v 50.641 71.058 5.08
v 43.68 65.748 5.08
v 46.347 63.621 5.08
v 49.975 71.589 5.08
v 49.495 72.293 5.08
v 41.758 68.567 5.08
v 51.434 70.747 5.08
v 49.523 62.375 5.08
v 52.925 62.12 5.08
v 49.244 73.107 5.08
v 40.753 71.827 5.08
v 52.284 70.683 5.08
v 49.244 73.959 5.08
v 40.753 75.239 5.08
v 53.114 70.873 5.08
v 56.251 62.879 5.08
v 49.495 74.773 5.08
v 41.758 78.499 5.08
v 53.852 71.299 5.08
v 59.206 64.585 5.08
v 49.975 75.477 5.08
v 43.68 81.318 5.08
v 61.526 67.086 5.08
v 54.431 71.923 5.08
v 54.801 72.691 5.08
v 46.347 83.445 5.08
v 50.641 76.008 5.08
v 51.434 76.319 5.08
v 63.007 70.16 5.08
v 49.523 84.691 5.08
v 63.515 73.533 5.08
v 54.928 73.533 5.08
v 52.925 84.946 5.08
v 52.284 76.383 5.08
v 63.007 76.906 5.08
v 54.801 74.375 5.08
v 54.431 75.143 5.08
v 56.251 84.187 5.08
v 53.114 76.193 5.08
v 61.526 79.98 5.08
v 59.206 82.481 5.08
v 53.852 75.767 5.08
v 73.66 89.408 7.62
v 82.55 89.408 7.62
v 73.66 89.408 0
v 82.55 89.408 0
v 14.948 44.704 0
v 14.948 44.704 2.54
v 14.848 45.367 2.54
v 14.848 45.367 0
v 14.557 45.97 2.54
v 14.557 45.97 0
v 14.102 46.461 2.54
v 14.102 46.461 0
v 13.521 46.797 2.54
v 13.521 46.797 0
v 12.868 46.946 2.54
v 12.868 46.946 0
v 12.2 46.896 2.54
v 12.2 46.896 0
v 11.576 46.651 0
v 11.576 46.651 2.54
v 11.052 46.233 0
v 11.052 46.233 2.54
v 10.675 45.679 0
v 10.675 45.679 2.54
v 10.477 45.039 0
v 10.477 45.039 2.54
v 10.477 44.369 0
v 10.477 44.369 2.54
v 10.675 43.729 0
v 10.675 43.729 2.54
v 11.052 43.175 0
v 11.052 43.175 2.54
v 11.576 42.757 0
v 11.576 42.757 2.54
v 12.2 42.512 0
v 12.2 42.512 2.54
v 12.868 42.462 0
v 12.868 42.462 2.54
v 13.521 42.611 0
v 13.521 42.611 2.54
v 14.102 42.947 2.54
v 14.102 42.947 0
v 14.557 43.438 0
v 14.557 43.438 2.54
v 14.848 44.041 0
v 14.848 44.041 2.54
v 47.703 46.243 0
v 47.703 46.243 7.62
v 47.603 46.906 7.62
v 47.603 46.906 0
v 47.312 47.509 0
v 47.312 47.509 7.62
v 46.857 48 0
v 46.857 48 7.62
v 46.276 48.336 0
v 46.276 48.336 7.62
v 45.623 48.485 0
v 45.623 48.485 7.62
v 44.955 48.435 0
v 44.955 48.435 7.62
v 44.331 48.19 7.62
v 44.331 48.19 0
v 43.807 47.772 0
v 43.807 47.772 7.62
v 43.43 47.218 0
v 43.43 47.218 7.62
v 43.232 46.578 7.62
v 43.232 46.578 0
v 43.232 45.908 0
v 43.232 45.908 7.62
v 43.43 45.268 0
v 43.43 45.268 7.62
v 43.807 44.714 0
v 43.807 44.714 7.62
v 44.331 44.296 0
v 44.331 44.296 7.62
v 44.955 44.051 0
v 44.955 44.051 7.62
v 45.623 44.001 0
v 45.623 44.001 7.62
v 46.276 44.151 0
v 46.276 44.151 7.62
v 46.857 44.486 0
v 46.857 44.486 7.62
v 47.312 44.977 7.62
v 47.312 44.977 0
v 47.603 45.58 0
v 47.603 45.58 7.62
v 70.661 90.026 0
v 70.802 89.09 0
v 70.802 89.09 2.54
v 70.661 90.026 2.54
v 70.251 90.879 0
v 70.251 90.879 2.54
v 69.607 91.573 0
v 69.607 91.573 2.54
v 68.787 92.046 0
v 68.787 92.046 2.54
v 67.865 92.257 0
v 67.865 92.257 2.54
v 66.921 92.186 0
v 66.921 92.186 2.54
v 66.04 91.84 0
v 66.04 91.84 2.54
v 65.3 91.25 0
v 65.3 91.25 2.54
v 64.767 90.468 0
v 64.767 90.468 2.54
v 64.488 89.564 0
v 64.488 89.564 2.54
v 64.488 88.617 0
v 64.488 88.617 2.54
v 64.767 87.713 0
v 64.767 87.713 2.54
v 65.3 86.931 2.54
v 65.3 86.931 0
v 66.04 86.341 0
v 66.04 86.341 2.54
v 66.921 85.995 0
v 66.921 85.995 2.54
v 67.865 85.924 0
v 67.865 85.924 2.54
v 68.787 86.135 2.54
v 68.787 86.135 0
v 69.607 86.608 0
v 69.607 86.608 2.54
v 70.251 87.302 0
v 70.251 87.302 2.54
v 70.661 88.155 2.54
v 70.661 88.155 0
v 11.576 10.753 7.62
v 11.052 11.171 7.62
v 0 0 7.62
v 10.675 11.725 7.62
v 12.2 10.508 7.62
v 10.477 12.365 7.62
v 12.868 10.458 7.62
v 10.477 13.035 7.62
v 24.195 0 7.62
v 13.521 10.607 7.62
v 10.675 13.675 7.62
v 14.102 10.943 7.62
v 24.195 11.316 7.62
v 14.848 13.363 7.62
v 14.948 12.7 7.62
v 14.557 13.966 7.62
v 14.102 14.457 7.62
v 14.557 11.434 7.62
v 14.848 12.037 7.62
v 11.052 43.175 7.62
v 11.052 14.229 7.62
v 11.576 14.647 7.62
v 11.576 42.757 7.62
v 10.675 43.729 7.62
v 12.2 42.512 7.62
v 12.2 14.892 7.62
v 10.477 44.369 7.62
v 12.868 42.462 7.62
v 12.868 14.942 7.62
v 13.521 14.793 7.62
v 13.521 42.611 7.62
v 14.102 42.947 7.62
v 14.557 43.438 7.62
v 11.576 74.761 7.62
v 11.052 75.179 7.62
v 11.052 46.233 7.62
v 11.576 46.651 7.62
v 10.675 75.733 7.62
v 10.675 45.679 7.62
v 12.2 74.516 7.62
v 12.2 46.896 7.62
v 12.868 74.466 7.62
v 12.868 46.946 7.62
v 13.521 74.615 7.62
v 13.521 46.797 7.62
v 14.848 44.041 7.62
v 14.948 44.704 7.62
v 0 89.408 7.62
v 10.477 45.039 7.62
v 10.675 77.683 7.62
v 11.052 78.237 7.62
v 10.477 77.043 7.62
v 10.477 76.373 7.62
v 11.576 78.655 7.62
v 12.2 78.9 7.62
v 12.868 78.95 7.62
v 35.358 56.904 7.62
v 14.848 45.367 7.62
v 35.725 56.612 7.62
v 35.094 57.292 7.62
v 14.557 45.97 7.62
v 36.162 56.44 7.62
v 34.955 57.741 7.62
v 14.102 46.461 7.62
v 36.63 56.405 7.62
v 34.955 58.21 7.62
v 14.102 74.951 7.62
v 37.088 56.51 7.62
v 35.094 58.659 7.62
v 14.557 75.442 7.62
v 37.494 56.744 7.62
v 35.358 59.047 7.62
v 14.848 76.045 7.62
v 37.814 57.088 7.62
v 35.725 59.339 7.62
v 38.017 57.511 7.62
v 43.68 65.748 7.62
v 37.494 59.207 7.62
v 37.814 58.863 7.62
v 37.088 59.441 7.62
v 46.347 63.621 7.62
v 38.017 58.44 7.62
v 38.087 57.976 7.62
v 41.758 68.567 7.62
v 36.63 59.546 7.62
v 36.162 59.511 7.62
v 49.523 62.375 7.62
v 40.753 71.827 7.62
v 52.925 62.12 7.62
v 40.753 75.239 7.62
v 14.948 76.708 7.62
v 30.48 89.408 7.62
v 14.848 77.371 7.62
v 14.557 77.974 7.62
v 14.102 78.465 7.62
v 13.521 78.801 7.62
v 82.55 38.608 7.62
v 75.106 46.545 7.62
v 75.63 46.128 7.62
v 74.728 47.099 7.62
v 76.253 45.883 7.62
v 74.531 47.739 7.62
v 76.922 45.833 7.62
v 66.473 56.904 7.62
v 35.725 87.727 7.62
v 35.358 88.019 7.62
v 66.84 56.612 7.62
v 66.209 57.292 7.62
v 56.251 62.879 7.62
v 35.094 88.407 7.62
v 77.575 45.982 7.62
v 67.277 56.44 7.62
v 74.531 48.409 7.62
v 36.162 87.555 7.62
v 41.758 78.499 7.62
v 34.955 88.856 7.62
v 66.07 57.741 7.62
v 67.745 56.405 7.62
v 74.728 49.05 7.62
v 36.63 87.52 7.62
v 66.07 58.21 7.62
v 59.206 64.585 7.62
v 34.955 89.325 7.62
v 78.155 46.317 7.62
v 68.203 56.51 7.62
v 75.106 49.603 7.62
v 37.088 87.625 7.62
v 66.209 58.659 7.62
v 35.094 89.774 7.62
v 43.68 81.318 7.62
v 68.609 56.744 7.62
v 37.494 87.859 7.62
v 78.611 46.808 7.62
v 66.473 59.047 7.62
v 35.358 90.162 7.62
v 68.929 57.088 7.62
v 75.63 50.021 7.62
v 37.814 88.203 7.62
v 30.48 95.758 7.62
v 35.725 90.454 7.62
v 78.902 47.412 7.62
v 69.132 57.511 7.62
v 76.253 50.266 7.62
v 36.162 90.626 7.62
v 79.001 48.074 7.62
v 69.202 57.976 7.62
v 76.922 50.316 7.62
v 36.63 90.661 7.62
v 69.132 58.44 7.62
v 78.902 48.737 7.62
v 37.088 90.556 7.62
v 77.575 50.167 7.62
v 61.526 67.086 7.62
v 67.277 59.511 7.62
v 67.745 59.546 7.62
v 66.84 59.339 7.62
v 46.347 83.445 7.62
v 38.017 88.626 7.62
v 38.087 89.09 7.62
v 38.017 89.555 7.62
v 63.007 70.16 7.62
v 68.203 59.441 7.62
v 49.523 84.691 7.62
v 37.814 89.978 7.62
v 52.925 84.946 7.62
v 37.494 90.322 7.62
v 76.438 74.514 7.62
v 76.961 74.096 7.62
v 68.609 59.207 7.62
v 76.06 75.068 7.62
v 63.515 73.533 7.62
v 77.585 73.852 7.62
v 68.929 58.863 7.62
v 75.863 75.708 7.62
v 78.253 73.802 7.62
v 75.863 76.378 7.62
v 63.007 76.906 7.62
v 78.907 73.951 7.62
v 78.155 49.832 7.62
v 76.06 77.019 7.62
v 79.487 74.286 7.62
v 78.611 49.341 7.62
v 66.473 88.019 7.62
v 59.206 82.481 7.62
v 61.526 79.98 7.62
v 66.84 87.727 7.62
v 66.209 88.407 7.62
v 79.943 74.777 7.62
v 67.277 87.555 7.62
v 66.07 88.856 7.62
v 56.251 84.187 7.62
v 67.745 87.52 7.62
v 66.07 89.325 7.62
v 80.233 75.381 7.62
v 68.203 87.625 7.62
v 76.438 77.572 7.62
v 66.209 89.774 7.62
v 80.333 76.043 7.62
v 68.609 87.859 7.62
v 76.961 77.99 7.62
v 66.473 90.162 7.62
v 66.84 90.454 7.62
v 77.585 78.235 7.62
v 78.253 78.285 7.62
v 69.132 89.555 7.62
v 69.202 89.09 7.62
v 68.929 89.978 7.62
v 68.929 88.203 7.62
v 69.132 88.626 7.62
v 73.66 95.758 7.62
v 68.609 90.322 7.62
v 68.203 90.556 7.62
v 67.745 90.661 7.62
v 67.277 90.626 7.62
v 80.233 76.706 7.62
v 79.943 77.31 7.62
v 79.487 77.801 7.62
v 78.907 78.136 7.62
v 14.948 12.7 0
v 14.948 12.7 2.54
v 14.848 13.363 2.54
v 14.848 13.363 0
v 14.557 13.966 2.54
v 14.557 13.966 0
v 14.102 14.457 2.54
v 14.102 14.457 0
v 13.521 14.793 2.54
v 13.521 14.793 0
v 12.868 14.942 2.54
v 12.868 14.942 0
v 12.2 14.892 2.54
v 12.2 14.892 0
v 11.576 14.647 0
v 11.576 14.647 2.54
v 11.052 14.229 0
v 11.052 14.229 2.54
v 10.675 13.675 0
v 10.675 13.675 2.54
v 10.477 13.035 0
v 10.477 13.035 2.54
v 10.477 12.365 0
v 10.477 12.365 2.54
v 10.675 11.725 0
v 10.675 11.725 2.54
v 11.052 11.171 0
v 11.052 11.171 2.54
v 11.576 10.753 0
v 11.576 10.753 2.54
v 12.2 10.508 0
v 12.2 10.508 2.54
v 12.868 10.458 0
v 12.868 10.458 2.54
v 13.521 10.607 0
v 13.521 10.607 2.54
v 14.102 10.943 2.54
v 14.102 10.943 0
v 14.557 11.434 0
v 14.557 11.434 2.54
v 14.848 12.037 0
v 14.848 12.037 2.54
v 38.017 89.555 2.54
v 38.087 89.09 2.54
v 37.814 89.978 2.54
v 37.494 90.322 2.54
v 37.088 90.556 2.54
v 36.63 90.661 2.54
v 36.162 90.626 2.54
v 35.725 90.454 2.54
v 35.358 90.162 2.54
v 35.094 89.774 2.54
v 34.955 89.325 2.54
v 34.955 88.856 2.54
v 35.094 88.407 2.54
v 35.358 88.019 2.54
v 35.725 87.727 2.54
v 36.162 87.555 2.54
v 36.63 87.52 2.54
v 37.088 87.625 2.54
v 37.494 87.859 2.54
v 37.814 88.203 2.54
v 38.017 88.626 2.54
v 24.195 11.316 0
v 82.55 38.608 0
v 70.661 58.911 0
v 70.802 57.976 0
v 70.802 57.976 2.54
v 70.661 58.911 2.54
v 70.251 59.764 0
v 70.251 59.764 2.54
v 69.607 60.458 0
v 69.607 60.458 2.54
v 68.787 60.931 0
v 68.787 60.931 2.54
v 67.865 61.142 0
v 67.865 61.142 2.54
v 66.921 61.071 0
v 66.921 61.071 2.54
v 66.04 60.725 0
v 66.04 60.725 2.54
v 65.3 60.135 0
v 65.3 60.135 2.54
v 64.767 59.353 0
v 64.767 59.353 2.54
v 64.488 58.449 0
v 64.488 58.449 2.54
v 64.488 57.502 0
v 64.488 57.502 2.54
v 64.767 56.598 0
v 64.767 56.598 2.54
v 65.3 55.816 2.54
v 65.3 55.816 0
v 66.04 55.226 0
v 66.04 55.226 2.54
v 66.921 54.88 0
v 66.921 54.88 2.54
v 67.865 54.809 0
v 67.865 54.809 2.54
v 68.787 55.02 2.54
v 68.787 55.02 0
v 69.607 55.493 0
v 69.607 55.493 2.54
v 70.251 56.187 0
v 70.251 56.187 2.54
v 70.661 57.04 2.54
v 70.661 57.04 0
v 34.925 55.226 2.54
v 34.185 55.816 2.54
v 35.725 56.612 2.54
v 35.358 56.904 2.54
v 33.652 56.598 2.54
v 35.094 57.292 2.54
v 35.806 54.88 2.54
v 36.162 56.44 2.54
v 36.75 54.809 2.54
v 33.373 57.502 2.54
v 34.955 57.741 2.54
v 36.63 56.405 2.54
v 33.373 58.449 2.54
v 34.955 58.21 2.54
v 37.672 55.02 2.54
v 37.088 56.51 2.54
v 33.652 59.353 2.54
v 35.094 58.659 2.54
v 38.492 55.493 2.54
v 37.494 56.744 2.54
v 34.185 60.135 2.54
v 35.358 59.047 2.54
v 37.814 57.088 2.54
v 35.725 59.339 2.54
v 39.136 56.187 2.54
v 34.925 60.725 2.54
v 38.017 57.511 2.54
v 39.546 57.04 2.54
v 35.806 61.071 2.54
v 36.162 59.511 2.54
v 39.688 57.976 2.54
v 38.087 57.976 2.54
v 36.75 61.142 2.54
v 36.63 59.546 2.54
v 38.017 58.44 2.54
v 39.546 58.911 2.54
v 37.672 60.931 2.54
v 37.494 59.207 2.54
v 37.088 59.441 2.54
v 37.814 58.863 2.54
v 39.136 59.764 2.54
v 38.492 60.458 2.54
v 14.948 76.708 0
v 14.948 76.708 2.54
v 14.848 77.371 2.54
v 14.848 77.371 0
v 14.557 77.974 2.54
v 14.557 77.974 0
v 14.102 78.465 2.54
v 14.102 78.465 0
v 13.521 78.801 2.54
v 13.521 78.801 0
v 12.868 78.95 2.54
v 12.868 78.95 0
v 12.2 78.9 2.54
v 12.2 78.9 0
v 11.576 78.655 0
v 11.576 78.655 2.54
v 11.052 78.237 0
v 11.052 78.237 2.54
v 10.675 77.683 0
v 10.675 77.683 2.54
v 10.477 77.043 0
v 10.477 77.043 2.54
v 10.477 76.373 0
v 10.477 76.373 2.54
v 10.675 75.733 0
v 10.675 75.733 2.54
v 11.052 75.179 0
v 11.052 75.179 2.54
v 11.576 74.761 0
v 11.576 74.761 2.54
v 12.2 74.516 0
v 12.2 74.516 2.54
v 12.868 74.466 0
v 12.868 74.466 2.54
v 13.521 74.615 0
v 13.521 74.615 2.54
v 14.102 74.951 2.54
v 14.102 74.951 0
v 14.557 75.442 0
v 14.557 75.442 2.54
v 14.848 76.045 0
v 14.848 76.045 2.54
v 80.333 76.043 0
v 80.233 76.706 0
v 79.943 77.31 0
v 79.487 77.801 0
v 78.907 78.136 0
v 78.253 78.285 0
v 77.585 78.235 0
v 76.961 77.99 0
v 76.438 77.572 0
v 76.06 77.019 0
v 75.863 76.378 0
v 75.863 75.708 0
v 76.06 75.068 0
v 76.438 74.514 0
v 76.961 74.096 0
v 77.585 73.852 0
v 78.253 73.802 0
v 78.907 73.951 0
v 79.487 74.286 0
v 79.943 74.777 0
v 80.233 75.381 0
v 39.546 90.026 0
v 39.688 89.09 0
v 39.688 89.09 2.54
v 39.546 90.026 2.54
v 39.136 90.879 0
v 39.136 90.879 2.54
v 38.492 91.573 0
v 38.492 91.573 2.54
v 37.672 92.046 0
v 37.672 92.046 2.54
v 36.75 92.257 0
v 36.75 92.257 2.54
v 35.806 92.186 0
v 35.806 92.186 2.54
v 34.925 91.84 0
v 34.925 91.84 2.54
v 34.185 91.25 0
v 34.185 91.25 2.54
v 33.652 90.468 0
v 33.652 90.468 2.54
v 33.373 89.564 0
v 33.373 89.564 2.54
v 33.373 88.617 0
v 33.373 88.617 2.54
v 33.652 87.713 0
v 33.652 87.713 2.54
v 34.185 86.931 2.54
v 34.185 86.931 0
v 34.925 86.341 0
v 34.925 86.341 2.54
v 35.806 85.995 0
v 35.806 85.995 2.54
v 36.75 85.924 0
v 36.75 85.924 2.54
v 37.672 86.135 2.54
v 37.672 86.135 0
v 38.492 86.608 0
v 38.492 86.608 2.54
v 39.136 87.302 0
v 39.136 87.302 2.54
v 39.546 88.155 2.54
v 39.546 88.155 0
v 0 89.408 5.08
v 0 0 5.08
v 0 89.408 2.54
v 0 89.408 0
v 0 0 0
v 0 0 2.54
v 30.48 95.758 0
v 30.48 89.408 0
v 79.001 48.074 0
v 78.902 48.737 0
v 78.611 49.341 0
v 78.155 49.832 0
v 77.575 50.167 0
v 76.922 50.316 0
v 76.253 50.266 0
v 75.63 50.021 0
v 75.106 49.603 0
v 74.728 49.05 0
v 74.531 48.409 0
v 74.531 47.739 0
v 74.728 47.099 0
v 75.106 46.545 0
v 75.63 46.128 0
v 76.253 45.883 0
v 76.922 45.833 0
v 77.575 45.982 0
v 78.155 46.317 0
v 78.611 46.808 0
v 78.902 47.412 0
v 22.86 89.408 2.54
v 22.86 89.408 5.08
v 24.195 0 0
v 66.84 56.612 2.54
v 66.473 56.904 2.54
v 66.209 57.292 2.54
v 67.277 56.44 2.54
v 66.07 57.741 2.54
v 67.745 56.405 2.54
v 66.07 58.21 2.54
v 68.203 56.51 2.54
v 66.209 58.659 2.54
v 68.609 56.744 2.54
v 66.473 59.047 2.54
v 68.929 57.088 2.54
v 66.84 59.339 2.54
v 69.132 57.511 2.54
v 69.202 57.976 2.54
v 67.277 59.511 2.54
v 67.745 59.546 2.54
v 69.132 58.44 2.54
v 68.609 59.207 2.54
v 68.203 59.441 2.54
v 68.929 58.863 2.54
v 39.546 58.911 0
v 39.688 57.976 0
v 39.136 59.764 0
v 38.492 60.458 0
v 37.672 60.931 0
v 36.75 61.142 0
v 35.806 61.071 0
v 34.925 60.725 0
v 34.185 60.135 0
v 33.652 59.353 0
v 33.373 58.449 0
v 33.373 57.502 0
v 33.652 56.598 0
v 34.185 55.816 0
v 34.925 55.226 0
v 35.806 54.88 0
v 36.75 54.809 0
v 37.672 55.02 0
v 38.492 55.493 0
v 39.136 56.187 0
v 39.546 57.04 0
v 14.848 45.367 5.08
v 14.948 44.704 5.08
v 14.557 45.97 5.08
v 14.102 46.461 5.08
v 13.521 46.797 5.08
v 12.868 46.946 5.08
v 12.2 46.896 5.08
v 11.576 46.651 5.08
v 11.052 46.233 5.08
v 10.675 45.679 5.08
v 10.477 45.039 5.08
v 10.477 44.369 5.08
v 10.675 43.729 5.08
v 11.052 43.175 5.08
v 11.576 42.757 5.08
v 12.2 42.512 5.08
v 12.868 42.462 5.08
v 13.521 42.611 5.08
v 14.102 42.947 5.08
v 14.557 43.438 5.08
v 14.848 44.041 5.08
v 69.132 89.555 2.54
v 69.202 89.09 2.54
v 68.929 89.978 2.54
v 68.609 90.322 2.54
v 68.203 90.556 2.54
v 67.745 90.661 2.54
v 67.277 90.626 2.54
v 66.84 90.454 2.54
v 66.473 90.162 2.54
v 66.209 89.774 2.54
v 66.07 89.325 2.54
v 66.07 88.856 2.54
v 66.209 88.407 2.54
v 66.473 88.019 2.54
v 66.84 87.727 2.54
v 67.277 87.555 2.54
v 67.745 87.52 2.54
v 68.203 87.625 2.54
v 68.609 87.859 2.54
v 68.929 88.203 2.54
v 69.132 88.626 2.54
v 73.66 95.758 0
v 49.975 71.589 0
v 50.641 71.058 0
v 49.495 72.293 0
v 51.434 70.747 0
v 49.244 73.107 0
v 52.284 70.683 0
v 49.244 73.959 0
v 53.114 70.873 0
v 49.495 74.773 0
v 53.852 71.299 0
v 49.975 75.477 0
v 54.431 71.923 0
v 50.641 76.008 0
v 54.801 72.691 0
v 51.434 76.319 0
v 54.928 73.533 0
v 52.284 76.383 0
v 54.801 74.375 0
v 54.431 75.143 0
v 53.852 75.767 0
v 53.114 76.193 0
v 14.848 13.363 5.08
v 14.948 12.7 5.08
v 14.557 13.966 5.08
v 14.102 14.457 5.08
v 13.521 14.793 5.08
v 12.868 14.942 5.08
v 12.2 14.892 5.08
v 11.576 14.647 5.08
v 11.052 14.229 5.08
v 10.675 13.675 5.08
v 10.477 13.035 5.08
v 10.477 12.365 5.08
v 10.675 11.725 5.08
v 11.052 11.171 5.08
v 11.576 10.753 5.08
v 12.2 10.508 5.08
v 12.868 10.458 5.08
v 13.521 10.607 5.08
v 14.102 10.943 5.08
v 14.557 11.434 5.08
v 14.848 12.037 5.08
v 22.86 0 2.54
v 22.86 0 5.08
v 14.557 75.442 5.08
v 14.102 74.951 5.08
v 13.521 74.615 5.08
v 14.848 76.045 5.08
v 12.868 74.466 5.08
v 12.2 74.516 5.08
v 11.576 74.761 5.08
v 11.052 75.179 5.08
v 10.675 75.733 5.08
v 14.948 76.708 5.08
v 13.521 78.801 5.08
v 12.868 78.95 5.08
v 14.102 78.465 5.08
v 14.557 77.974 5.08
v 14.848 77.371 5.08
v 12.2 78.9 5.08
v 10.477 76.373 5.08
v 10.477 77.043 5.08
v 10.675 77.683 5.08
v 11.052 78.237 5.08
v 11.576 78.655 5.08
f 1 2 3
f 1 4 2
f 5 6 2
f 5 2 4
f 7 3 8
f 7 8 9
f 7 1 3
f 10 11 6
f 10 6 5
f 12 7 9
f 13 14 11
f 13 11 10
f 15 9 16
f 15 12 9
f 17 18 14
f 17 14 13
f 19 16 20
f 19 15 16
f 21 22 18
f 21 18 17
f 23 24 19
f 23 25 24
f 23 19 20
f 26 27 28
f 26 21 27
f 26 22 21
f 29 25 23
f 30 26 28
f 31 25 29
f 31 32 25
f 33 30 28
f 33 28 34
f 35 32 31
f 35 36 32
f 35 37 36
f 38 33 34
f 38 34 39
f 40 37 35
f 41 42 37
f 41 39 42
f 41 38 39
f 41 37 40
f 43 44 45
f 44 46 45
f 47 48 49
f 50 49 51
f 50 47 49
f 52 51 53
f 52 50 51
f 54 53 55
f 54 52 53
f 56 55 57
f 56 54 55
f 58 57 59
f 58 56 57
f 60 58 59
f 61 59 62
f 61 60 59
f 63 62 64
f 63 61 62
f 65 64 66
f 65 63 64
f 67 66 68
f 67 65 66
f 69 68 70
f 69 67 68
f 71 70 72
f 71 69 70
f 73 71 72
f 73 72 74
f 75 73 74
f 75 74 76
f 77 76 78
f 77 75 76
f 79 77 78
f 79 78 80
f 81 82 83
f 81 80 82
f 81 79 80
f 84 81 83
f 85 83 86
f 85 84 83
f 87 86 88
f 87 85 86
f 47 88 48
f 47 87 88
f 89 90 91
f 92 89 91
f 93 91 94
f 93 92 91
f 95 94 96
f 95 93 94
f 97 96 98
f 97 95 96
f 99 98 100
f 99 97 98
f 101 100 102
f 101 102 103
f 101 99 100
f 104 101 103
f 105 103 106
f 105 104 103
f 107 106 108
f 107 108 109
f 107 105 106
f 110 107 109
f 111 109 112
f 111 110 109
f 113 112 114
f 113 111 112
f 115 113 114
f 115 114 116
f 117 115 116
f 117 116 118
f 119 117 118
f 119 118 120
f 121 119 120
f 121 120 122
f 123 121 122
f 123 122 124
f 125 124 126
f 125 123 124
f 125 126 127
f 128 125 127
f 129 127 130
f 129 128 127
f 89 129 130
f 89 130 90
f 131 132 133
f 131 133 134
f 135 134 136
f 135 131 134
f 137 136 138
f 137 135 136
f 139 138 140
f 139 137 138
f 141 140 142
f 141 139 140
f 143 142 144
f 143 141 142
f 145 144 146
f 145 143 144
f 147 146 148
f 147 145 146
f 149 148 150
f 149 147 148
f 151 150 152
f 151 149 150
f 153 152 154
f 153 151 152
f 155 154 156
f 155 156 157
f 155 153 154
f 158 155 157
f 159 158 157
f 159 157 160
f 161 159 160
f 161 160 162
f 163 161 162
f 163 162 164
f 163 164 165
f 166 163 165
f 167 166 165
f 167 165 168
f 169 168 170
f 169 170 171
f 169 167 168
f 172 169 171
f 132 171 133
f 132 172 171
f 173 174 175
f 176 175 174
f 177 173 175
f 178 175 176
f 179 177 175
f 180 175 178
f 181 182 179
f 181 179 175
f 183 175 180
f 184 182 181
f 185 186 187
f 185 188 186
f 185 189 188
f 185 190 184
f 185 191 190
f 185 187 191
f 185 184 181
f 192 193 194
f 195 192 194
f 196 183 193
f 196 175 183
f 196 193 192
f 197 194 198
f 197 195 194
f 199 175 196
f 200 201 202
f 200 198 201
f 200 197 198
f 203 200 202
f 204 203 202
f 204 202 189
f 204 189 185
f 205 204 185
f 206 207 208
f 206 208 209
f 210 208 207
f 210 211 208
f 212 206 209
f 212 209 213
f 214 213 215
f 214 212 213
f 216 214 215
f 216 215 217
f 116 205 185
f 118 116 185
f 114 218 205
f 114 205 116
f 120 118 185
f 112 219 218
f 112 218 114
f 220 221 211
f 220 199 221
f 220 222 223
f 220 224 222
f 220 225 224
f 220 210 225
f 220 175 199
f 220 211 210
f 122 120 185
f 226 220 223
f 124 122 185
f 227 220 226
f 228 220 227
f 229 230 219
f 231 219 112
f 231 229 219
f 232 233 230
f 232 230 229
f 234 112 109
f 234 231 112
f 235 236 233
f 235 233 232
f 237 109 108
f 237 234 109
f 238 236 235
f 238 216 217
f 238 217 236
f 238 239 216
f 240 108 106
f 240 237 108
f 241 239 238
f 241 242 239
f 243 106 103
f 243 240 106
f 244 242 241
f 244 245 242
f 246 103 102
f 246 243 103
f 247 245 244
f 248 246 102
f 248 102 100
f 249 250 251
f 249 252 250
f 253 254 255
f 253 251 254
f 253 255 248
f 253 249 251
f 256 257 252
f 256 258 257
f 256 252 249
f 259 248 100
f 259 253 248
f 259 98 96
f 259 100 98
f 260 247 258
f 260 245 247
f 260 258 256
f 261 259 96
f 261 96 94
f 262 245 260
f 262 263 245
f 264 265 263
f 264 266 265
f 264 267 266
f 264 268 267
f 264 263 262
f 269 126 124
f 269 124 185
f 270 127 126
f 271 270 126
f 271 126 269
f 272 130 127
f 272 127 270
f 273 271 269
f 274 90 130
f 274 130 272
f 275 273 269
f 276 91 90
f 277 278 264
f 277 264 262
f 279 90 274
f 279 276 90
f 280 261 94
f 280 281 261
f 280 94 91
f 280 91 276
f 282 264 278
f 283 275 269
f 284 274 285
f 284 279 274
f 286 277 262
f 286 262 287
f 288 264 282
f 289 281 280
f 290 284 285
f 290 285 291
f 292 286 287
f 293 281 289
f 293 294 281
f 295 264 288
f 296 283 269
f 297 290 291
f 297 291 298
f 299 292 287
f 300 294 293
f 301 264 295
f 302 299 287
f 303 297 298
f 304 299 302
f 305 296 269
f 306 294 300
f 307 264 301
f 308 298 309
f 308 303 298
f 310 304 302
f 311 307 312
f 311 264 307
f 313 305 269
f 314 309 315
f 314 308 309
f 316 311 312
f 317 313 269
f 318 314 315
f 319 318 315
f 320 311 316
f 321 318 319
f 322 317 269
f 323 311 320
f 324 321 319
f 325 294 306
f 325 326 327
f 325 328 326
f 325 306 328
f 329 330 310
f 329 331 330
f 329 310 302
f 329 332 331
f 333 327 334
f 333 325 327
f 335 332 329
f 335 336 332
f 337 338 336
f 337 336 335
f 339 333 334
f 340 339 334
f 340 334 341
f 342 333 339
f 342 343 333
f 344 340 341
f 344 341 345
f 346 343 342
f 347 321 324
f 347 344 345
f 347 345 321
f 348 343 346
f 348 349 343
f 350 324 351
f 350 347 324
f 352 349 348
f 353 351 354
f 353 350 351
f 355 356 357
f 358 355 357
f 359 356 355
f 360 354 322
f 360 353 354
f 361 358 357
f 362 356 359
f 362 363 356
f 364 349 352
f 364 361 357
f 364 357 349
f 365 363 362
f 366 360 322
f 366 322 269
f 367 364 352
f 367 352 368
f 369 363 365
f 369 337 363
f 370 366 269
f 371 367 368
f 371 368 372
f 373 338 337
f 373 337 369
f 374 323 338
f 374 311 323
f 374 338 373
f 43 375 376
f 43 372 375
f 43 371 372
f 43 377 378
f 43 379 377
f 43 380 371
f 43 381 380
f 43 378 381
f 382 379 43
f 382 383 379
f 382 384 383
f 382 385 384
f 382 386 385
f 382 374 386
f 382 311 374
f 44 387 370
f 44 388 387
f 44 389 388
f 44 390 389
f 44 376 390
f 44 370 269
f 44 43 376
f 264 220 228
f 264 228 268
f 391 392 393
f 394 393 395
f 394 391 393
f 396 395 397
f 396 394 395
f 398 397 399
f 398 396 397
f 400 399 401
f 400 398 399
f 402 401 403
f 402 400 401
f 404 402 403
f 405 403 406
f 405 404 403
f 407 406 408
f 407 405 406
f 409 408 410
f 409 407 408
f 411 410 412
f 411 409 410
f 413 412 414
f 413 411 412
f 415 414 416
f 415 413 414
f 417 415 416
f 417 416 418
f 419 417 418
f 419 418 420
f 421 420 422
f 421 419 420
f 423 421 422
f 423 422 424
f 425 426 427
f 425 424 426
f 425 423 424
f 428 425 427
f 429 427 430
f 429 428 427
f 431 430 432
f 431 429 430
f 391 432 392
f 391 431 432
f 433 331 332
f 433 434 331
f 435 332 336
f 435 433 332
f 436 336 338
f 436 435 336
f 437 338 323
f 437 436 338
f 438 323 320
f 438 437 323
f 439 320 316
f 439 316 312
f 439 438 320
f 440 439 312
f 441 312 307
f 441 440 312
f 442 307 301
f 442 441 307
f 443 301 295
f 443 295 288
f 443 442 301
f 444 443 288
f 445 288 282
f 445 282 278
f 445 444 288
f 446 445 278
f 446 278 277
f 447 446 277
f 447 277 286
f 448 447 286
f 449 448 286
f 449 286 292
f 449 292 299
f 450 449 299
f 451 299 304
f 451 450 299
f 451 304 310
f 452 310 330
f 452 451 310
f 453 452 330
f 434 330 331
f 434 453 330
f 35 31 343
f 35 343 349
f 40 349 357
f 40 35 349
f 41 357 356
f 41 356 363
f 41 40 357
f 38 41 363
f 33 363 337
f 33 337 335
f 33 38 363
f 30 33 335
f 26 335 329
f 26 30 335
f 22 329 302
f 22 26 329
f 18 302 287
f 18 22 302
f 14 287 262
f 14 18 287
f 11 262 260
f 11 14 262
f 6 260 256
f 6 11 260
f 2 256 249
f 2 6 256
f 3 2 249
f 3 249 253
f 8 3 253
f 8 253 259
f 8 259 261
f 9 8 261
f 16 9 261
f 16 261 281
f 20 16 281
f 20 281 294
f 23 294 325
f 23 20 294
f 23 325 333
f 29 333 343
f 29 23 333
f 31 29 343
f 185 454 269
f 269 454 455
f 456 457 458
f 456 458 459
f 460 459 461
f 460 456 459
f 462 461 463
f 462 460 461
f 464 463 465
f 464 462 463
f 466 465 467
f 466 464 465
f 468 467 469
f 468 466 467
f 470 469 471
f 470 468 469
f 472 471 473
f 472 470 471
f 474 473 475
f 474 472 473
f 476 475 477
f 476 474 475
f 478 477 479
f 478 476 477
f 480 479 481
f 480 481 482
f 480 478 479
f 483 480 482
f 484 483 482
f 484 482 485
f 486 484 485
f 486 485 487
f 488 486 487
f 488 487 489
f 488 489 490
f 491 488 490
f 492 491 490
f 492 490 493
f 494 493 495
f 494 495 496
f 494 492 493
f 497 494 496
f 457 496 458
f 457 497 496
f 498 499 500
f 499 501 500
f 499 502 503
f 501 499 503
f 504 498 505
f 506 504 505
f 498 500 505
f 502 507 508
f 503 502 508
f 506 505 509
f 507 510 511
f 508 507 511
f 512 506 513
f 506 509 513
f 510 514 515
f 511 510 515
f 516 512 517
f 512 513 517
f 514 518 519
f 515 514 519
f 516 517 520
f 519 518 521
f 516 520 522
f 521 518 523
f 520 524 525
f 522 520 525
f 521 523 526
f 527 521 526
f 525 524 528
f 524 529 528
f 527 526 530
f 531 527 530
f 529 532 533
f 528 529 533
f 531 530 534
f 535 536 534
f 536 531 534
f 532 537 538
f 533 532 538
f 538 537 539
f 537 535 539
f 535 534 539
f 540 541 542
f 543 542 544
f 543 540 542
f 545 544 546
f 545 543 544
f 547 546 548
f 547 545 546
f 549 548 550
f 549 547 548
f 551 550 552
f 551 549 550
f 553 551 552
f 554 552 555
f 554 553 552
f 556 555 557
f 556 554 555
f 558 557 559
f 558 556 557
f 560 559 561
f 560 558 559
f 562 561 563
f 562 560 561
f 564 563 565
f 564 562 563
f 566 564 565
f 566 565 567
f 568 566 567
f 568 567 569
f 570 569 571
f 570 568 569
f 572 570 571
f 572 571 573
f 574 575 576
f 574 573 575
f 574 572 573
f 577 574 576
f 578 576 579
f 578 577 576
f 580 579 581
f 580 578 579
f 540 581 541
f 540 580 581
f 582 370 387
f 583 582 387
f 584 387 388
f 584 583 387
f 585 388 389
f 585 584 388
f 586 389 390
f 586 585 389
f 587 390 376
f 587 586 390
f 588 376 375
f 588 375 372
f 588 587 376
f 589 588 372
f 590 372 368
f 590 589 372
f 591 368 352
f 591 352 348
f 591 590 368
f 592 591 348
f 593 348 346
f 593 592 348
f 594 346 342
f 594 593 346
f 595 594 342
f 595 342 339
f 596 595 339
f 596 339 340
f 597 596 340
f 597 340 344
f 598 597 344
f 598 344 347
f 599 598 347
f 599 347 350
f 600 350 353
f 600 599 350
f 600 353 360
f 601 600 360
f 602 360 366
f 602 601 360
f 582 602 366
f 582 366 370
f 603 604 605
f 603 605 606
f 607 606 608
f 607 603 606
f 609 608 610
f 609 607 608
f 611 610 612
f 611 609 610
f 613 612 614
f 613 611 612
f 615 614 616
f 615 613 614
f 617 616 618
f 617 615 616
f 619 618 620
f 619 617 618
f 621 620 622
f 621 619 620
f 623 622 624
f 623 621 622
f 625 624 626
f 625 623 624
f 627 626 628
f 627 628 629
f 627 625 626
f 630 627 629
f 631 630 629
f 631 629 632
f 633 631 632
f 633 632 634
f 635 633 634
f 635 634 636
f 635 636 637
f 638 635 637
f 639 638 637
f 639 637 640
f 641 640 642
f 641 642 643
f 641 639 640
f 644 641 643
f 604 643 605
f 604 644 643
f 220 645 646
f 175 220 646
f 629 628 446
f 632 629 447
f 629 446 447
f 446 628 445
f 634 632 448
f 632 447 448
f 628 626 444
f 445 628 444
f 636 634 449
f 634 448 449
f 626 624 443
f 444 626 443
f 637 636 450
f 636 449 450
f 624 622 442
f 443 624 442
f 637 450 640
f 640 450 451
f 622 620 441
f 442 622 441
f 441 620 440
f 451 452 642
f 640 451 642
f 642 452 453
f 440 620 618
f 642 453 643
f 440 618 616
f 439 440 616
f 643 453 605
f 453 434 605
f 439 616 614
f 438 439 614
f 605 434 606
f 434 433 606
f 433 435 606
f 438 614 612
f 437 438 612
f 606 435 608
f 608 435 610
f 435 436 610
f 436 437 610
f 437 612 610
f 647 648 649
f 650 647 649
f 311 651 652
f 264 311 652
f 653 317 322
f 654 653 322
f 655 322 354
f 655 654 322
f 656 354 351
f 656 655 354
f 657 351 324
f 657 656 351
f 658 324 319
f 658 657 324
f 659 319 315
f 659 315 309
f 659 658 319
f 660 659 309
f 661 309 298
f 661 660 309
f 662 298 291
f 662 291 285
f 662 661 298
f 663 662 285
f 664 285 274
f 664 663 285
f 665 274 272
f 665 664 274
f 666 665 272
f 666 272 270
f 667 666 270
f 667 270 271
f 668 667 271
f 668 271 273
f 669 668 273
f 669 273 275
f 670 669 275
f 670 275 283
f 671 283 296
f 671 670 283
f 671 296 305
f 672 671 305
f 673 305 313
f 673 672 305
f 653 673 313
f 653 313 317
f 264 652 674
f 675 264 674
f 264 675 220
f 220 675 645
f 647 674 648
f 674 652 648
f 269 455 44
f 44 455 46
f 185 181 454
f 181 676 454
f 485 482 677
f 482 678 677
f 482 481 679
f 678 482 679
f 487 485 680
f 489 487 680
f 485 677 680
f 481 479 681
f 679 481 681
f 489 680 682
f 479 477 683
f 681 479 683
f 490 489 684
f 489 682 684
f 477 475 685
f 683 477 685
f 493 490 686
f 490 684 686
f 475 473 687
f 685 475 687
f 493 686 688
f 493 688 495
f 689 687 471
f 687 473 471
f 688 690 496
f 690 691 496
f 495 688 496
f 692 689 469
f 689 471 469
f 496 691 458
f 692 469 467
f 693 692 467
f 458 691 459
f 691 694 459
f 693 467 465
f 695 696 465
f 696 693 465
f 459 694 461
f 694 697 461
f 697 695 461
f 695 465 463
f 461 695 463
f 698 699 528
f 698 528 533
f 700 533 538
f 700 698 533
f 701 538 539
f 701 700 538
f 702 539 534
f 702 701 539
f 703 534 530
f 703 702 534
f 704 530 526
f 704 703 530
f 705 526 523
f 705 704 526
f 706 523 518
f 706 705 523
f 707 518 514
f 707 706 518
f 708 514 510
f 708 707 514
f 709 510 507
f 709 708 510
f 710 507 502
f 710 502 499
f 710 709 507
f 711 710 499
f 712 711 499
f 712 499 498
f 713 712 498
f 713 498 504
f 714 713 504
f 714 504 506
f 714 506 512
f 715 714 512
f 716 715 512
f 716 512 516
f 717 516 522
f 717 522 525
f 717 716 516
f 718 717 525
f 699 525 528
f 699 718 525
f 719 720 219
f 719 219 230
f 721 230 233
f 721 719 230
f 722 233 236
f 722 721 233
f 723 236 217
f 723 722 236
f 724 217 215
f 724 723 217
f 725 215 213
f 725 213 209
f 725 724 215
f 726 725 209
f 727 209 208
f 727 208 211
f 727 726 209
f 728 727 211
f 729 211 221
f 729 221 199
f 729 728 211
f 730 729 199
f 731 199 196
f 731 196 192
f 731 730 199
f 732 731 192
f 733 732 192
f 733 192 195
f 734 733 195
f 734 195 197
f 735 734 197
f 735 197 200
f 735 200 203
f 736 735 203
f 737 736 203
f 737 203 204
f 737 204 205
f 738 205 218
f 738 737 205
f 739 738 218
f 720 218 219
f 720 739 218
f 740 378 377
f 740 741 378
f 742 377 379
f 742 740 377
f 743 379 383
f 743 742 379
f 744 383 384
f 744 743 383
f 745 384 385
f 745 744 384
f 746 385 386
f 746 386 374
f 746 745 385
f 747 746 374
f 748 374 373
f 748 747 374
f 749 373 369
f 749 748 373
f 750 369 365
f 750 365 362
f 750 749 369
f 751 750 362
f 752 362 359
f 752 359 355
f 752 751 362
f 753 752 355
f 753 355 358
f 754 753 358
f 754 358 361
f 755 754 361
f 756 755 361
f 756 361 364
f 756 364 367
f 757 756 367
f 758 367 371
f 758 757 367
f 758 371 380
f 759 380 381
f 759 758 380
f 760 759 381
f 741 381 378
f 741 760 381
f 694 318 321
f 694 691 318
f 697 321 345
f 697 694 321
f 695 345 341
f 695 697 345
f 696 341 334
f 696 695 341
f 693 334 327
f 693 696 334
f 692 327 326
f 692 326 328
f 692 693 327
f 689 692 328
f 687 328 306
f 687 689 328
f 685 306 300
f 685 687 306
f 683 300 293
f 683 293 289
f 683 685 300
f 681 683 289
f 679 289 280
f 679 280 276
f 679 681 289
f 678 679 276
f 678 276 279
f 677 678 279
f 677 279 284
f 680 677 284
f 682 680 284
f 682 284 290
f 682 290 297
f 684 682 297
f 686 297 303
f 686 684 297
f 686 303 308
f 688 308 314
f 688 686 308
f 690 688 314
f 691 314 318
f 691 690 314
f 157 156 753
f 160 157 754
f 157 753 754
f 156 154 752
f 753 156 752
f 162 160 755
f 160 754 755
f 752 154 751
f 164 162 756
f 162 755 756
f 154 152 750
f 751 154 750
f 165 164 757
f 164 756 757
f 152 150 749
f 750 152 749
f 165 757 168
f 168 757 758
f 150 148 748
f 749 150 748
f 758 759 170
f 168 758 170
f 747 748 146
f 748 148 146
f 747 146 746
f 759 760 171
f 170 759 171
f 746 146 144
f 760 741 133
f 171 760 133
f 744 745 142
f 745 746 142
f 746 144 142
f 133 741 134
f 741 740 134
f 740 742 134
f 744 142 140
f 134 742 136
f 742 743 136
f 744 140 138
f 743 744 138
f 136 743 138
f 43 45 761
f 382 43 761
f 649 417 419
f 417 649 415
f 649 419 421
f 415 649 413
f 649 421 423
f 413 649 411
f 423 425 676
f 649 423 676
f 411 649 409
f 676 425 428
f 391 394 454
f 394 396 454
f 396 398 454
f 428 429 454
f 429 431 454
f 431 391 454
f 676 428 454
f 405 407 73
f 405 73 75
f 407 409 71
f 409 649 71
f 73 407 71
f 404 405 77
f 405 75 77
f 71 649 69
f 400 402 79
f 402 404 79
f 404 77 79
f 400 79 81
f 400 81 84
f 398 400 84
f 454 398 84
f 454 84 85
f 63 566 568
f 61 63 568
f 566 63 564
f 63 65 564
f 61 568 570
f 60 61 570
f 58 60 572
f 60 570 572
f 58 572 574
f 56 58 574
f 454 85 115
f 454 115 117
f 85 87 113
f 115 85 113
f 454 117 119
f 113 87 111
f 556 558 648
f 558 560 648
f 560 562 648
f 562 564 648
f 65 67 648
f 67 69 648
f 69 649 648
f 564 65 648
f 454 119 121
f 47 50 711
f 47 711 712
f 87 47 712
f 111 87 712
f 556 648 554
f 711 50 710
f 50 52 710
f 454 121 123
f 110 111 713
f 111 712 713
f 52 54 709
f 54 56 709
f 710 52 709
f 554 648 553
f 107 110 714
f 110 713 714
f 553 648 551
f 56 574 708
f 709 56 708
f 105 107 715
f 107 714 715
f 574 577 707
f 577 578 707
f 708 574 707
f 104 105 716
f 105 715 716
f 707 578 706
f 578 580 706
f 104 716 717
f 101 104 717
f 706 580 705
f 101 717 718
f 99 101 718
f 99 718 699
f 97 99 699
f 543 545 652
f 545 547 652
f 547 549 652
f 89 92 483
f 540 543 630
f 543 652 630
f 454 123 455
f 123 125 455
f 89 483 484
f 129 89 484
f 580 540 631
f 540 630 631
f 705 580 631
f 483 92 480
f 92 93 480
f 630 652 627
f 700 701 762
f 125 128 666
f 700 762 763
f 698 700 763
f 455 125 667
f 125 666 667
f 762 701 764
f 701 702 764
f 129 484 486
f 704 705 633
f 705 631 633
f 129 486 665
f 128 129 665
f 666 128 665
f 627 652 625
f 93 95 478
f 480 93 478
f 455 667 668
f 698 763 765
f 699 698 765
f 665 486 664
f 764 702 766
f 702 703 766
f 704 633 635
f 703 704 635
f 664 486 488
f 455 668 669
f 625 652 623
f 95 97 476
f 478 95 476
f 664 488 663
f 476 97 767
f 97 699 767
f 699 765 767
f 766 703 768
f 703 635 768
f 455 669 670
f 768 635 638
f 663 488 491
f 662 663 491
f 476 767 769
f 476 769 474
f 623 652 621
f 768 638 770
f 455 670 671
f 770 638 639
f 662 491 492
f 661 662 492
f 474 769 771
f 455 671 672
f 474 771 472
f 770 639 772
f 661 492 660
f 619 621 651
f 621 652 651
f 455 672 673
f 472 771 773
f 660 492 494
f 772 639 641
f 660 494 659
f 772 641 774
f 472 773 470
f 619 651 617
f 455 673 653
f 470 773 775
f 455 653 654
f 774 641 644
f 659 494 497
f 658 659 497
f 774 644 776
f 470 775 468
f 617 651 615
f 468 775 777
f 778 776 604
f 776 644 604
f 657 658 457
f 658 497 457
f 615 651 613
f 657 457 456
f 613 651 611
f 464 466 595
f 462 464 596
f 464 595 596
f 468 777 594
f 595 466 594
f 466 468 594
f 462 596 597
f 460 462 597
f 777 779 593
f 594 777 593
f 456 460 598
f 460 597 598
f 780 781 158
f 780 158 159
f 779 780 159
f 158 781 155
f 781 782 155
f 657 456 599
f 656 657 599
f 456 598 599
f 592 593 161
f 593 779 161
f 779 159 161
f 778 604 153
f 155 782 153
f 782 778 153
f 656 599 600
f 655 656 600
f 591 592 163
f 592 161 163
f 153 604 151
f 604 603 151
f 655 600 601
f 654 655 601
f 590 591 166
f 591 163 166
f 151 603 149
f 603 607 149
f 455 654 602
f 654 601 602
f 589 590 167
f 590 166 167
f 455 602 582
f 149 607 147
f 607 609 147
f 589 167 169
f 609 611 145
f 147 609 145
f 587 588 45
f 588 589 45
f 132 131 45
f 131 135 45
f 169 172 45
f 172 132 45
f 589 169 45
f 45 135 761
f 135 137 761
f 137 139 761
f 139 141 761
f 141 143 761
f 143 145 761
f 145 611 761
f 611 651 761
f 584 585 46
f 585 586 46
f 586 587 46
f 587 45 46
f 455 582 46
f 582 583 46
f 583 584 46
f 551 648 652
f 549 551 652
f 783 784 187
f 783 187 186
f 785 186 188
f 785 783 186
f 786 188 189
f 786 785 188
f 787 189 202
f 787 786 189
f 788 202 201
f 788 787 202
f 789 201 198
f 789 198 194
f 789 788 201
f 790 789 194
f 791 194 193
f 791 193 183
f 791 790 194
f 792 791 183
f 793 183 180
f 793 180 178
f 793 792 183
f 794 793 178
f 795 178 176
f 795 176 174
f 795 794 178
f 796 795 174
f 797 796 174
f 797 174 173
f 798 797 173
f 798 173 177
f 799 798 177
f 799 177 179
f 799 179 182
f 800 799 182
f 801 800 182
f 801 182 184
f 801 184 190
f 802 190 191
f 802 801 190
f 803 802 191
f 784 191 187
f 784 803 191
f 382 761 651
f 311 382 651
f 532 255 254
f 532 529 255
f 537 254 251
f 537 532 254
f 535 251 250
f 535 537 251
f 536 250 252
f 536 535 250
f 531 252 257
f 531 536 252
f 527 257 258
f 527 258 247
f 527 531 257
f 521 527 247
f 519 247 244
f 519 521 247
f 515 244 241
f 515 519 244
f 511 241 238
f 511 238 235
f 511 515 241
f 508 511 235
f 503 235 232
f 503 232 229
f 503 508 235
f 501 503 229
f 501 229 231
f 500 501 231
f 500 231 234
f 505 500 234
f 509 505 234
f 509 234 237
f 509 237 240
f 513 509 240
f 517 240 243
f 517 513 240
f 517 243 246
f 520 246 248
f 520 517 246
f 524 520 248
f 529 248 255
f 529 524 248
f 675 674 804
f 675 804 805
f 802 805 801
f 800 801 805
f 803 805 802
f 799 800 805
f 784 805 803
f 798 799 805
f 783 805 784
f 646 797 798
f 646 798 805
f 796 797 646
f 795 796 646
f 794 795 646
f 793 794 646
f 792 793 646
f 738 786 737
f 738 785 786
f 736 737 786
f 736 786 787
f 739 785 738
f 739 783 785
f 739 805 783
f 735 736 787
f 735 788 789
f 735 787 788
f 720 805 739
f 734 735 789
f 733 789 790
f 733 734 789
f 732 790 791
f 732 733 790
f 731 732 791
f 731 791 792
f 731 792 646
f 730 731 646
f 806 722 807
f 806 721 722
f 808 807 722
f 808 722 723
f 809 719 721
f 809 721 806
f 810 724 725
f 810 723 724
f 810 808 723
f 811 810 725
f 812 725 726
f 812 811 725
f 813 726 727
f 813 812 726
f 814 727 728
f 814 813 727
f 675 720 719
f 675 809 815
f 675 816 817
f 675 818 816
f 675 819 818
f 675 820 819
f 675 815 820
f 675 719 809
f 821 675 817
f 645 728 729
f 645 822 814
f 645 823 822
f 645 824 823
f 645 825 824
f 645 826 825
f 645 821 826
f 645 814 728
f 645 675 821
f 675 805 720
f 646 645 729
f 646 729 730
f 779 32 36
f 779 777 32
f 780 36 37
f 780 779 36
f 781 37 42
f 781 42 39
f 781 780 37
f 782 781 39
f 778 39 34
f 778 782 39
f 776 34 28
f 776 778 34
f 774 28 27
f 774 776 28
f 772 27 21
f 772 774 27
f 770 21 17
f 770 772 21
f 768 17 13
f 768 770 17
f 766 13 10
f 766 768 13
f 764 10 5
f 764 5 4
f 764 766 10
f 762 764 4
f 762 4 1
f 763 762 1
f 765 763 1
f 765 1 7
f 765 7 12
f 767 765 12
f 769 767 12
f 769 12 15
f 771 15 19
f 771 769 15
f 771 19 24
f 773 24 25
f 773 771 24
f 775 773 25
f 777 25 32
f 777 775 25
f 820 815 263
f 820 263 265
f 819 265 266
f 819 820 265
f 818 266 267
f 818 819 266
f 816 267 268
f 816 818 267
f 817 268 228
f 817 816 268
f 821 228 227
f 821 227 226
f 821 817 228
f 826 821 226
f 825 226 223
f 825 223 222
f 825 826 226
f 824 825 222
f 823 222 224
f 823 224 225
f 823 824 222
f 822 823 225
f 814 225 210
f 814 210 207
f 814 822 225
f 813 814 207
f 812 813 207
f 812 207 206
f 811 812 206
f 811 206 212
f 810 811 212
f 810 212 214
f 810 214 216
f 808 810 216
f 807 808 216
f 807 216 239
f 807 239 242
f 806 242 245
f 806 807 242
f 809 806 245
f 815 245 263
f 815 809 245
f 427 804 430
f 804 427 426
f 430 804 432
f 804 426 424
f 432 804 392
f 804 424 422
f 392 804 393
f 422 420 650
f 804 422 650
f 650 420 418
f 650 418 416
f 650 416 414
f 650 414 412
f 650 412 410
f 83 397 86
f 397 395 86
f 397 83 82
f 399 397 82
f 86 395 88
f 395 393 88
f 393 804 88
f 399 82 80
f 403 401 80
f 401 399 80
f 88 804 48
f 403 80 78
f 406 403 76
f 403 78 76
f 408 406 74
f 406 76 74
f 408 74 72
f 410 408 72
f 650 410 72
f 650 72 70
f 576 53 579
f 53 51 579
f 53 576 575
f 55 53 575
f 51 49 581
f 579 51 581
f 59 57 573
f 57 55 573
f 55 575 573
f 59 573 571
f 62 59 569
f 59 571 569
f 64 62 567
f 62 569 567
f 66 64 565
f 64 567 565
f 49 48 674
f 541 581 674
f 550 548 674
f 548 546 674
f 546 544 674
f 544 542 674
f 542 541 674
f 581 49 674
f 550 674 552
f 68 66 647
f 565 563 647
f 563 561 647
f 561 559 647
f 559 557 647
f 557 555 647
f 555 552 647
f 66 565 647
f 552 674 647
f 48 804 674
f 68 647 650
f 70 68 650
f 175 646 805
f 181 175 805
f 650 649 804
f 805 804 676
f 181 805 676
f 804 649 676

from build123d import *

# Parameters (mm, degrees)
F0_R     = 2.2479
F0_R_2   = 3.175
F0_R_3   = 11.43
F0_R_4   = 2.8575
F1_DEPTH = 2.54
F2_R     = 2.2479
F2_R_2   = 3.175
F2_R_3   = 2.8575
F2_R_4   = 1.574685516
F3_DEPTH = 2.54
F4_R     = 2.2479
F4_R_2   = 1.574685516
F4_R_3   = 11.4450762602
F5_DEPTH = 2.54
F6_DEPTH = 5.08
F7_W     = 22.86
F7_H     = 2.54
F8_DEPTH = 89.409


with BuildPart() as f1:
    # F0 (on Top) → F1 (new body)
    with BuildSketch(Plane.XY):
        Polygon((0, 89.408), (0, 0), (24.1954457015, 0), (24.1954457015, 11.3160238358), (82.55, 38.608), (82.55, 89.408), (73.66, 89.408), (73.66, 95.758), (30.48, 95.758), (30.48, 89.408), align=None)
        with Locations((12.7, 12.7)):
            Circle(F0_R, mode=Mode.SUBTRACT)
        with Locations((12.7, 44.704)):
            Circle(F0_R, mode=Mode.SUBTRACT)
        with Locations((45.4550236464, 46.2430119514)):
            Circle(F0_R, mode=Mode.SUBTRACT)
        with Locations((36.5125, 57.9755)):
            Circle(F0_R_2, mode=Mode.SUBTRACT)
        with Locations((12.7, 76.708)):
            Circle(F0_R, mode=Mode.SUBTRACT)
        with Locations((36.5125, 89.0905)):
            Circle(F0_R_2, mode=Mode.SUBTRACT)
        with Locations((67.6275, 57.9755)):
            Circle(F0_R_2, mode=Mode.SUBTRACT)
        with Locations((76.7535641789, 48.0743087828)):
            Circle(F0_R, mode=Mode.SUBTRACT)
        with Locations((52.07, 73.533)):
            Circle(F0_R_3, mode=Mode.SUBTRACT)
        with Locations((78.0854150653, 76.0432183743)):
            Circle(F0_R, mode=Mode.SUBTRACT)
        with Locations((67.6275, 89.0905)):
            Circle(F0_R_2, mode=Mode.SUBTRACT)
        with Locations((52.07, 73.533)):
            Circle(F0_R_3)
        with Locations((52.07, 73.533)):
            Circle(F0_R_4, mode=Mode.SUBTRACT)
    extrude(amount=F1_DEPTH)

    # F2 (on face) → F3 (join)
    with BuildSketch(Plane.XY.offset(2.54)):
        Polygon((30.48, 89.408), (25.4, 89.408), (25.4, 11.8793846154), (82.55, 38.608), (82.55, 89.408), (73.66, 89.408), (73.66, 95.758), (30.48, 95.758), align=None)
        with Locations((45.4550236464, 46.2430119514)):
            Circle(F2_R, mode=Mode.SUBTRACT)
        with Locations((36.5125, 57.9755)):
            Circle(F2_R_2, mode=Mode.SUBTRACT)
        with Locations((36.5125, 89.0905)):
            Circle(F2_R_2, mode=Mode.SUBTRACT)
        with Locations((67.6275, 57.9755)):
            Circle(F2_R_2, mode=Mode.SUBTRACT)
        with Locations((76.7535641789, 48.0743087828)):
            Circle(F2_R, mode=Mode.SUBTRACT)
        with Locations((52.07, 73.533)):
            Circle(F2_R_3, mode=Mode.SUBTRACT)
        with Locations((78.0854150653, 76.0432183743)):
            Circle(F2_R, mode=Mode.SUBTRACT)
        with Locations((67.6275, 89.0905)):
            Circle(F2_R_2, mode=Mode.SUBTRACT)
        with Locations((36.5125, 57.9755)):
            Circle(F2_R_2)
        with Locations((36.5125, 57.9755)):
            Circle(F2_R_4, mode=Mode.SUBTRACT)
        with Locations((67.6275, 57.9755)):
            Circle(F2_R_2)
        with Locations((67.6275, 57.9755)):
            Circle(F2_R_4, mode=Mode.SUBTRACT)
        with Locations((67.6275, 89.0905)):
            Circle(F2_R_2)
        with Locations((67.6275, 89.0905)):
            Circle(F2_R_4, mode=Mode.SUBTRACT)
        with Locations((36.5125, 89.0905)):
            Circle(F2_R_2)
        with Locations((36.5125, 89.0905)):
            Circle(F2_R_4, mode=Mode.SUBTRACT)
    extrude(amount=F3_DEPTH)

    # F4 (on face) → F5 (join)
    with BuildSketch(Plane.XY.offset(5.08)):
        Polygon((30.48, 89.408), (25.4, 89.408), (25.4, 11.8793846154), (82.55, 38.608), (82.55, 89.408), (73.66, 89.408), (73.66, 95.758), (30.48, 95.758), align=None)
        with Locations((45.4550236464, 46.2430119514)):
            Circle(F4_R, mode=Mode.SUBTRACT)
        with Locations((36.5125, 57.9755)):
            Circle(F4_R_2, mode=Mode.SUBTRACT)
        with Locations((36.5125, 89.0905)):
            Circle(F4_R_2, mode=Mode.SUBTRACT)
        with Locations((67.6275, 57.9755)):
            Circle(F4_R_2, mode=Mode.SUBTRACT)
        with Locations((76.7535641789, 48.0743087828)):
            Circle(F4_R, mode=Mode.SUBTRACT)
        with Locations((52.07, 73.533)):
            Circle(F4_R_3, mode=Mode.SUBTRACT)
        with Locations((78.0854150653, 76.0432183743)):
            Circle(F4_R, mode=Mode.SUBTRACT)
        with Locations((67.6275, 89.0905)):
            Circle(F4_R_2, mode=Mode.SUBTRACT)
    extrude(amount=F5_DEPTH)

    # F6 (add): a face of the model
    f6_faces = [f1.faces().sort_by_distance(p)[0] for p in [
        (12.7, 88.4785404547, 2.54),
    ]]
    extrude(f6_faces, amount=F6_DEPTH)

    # F7 (on face) → F8 (cut, through all)
    with BuildSketch(Plane(origin=(0, 89.408, 0), x_dir=(-1, 0, 0), z_dir=(0, 1, 0))):
        with Locations((-11.43, 3.81)):
            Rectangle(F7_W, F7_H)
    extrude(amount=-F8_DEPTH, mode=Mode.SUBTRACT)


solid = f1.part
